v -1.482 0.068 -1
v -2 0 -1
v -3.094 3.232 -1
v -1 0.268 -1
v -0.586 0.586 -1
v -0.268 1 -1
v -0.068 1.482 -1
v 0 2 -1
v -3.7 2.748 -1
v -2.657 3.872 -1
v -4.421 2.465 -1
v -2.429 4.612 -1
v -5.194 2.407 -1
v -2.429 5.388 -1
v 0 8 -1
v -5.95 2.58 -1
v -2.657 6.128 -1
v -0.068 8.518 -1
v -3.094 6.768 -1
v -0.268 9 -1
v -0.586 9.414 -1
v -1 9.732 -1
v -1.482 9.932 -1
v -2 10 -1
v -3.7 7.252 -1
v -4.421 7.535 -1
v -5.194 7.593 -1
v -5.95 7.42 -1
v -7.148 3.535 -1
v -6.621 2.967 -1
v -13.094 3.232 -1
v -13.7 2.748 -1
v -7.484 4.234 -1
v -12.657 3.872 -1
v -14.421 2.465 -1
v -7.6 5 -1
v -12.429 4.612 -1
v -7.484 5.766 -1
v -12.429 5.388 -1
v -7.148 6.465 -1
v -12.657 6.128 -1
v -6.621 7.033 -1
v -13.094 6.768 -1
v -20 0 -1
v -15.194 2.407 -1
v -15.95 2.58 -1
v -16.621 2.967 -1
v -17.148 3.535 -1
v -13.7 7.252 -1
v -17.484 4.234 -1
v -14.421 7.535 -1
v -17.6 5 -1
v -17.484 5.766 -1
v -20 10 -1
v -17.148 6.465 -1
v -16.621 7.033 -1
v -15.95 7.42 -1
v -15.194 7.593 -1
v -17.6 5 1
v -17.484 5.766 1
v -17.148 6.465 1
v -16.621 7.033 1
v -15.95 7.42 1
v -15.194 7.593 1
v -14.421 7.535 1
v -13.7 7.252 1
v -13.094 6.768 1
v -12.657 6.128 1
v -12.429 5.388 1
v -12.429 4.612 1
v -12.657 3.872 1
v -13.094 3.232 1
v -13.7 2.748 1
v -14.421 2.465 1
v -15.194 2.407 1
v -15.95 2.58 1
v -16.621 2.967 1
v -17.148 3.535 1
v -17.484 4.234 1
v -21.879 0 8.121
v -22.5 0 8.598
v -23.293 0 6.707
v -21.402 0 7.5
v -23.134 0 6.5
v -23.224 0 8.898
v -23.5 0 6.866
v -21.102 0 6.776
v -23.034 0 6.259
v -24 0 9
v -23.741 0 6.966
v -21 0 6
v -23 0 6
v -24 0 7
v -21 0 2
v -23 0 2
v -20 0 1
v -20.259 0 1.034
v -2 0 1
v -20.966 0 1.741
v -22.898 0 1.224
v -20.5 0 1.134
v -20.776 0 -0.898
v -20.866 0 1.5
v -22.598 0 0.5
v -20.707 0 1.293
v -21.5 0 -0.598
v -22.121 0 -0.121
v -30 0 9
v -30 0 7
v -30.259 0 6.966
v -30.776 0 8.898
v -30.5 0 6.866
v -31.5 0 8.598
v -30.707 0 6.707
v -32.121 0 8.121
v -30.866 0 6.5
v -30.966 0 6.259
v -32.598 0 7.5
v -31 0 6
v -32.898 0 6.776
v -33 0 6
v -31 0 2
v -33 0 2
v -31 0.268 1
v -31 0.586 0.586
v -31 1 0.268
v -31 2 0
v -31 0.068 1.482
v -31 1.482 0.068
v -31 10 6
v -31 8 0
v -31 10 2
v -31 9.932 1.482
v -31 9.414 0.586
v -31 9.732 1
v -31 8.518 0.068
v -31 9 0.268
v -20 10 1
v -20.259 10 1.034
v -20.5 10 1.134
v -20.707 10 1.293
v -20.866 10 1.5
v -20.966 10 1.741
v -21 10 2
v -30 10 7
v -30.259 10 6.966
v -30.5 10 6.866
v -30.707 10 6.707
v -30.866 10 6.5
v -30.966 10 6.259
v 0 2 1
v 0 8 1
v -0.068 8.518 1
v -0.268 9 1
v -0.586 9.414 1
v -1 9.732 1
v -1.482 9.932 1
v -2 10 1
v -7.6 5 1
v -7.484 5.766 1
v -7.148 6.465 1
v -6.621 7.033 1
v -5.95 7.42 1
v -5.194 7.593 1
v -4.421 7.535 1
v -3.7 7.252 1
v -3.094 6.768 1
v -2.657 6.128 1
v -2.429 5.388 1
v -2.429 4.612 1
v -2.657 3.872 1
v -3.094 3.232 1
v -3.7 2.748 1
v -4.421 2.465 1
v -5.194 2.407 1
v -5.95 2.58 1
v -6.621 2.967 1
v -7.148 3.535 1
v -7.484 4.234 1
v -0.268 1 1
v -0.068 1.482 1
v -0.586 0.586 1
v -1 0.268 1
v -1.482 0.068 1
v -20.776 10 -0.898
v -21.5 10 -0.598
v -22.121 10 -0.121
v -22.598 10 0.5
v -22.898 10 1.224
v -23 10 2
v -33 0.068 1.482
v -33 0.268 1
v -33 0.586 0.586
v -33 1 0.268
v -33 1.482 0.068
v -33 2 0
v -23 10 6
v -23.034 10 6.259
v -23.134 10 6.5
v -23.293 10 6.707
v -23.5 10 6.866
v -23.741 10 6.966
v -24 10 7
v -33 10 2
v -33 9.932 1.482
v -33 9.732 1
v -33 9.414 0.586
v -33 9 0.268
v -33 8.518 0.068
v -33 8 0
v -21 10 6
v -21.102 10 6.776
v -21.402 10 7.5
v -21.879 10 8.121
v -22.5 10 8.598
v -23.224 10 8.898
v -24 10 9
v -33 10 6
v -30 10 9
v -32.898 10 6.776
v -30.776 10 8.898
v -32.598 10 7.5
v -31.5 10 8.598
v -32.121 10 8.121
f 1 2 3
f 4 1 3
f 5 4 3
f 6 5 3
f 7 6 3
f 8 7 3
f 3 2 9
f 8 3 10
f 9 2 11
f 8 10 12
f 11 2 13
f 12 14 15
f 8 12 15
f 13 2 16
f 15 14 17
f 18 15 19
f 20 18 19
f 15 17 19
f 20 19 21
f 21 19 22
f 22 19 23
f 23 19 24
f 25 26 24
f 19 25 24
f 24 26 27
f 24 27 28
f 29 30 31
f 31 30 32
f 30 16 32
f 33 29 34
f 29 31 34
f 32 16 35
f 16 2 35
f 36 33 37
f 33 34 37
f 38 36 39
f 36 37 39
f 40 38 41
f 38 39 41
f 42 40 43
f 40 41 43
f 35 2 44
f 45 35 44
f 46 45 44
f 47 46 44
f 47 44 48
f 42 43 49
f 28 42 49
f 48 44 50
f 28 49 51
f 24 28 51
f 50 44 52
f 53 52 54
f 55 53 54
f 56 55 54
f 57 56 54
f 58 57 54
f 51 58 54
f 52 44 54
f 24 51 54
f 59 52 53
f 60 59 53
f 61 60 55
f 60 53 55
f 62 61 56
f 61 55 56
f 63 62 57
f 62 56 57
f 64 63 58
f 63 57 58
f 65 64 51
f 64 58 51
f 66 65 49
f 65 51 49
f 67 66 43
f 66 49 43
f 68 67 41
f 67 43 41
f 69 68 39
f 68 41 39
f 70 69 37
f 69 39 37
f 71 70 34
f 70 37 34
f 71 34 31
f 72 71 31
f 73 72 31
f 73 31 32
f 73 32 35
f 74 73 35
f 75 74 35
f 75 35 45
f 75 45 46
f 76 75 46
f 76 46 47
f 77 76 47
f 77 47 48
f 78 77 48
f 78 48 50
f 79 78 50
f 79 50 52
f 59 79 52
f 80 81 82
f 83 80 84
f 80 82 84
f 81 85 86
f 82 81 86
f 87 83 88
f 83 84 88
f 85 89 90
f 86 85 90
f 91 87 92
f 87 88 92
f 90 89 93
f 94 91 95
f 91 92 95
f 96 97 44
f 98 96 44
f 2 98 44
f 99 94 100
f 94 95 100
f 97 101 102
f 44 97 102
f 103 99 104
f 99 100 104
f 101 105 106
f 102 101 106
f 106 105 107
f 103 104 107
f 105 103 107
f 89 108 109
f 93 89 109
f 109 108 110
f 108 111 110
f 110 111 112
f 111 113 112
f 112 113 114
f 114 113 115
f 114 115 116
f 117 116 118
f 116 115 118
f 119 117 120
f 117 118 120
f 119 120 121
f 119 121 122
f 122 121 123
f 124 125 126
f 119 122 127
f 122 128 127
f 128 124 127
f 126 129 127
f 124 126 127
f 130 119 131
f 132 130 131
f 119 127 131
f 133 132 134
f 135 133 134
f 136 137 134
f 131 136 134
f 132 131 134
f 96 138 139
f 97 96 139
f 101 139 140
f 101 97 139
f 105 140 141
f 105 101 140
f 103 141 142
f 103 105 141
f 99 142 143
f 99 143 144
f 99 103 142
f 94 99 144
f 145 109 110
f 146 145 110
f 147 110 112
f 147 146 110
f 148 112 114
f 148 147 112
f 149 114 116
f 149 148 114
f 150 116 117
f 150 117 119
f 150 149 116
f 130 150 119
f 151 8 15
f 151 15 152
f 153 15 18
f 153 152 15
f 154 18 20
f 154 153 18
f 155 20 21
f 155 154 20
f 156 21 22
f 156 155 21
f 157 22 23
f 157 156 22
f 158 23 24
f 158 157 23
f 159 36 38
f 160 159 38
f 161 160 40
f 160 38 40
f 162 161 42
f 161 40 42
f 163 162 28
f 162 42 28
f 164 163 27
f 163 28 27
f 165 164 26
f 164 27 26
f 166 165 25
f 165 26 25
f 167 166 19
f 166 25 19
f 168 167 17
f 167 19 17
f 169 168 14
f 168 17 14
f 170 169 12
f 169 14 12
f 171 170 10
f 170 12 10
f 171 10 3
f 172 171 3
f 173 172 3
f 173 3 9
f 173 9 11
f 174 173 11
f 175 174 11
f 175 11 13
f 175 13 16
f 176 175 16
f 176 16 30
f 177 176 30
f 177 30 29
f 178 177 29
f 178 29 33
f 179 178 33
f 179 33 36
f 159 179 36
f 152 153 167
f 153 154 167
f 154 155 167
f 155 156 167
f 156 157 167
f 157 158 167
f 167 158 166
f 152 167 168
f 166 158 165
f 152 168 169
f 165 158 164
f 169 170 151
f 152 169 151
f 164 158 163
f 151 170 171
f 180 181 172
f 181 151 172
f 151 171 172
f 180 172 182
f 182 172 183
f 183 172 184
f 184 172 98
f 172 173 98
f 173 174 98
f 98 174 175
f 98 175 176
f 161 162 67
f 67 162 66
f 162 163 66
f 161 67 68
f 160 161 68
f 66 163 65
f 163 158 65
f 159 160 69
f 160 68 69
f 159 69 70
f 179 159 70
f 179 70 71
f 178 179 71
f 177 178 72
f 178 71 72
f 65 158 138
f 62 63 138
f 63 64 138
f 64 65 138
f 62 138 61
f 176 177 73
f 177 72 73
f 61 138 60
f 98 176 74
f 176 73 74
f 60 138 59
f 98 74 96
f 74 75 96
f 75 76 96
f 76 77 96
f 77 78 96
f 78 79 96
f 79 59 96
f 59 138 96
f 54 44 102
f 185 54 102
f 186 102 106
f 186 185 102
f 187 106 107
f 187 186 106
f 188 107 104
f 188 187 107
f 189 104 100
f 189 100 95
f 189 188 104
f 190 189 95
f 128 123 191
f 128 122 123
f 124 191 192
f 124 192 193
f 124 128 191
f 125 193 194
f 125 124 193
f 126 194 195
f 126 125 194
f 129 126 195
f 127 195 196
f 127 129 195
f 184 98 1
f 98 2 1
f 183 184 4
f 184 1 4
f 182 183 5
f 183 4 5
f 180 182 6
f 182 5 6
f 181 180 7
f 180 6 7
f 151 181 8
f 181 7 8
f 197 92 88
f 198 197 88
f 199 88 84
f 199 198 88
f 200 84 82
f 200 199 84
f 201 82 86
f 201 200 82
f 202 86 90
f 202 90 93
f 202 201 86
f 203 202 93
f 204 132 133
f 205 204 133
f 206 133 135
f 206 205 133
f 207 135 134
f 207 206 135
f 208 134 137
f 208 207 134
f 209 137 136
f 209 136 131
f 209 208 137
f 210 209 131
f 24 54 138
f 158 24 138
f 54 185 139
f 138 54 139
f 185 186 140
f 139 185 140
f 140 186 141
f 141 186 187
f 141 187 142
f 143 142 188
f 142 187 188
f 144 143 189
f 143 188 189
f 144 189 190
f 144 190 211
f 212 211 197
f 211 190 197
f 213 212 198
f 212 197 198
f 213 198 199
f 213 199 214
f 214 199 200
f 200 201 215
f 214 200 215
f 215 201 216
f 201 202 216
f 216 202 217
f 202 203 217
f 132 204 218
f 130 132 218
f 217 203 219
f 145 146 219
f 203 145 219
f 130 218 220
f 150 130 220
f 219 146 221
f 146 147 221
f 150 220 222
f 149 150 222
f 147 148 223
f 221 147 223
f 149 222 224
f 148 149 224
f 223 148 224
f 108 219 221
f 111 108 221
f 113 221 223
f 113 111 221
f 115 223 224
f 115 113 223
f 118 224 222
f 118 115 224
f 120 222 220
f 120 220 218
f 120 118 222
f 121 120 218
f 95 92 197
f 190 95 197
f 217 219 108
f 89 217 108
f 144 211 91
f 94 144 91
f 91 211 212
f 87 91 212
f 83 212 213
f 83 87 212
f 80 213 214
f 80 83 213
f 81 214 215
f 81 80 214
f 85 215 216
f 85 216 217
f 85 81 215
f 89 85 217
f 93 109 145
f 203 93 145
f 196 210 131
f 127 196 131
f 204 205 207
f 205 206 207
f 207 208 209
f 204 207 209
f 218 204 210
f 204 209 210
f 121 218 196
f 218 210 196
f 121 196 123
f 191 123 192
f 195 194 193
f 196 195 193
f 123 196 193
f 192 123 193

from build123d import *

# Parameters (mm, degrees)
F1_W = 10
F1_H = 2
F3_R = 2
F4_R = 2
F6_D = 5.2


with BuildPart() as f2:
    # F2: sweep along a path in F0
    with BuildLine(Plane.XZ) as f2_path:
        Line((0, 0), (-20, 0))
        ThreePointArc((-20, 0), (-21.4142135624, 0.5857864376), (-22, 2))
        Line((-22, 2), (-22, 6))
        ThreePointArc((-22, 6), (-22.5857864376, 7.4142135624), (-24, 8))
        Line((-24, 8), (-30, 8))
        ThreePointArc((-30, 8), (-31.4142135624, 7.4142135624), (-32, 6))
        Line((-32, 6), (-32, 0))
    # F1 (on Right) → F2 (sweep)
    with BuildSketch(Plane.YZ):
        with Locations((5, 0)):
            Rectangle(F1_W, F1_H)
    sweep(path=f2_path.line)

    # F3
    f3_edges = [f2.edges().sort_by_distance(p)[0] for p in [
        (-32, 0, 0),
        (-32, 10, 0),
    ]]
    fillet(f3_edges, radius=F3_R)

    # F4
    f4_edges = [f2.edges().sort_by_distance(p)[0] for p in [
        (0, 0, 0),
        (0, 10, 0),
    ]]
    fillet(f4_edges, radius=F4_R)

    # F6 (through all)
    with Locations(Plane.XY.offset(1)):
        with Locations((-15, 5), (-5, 5)):
            Hole(F6_D / 2)


solid = f2.part
